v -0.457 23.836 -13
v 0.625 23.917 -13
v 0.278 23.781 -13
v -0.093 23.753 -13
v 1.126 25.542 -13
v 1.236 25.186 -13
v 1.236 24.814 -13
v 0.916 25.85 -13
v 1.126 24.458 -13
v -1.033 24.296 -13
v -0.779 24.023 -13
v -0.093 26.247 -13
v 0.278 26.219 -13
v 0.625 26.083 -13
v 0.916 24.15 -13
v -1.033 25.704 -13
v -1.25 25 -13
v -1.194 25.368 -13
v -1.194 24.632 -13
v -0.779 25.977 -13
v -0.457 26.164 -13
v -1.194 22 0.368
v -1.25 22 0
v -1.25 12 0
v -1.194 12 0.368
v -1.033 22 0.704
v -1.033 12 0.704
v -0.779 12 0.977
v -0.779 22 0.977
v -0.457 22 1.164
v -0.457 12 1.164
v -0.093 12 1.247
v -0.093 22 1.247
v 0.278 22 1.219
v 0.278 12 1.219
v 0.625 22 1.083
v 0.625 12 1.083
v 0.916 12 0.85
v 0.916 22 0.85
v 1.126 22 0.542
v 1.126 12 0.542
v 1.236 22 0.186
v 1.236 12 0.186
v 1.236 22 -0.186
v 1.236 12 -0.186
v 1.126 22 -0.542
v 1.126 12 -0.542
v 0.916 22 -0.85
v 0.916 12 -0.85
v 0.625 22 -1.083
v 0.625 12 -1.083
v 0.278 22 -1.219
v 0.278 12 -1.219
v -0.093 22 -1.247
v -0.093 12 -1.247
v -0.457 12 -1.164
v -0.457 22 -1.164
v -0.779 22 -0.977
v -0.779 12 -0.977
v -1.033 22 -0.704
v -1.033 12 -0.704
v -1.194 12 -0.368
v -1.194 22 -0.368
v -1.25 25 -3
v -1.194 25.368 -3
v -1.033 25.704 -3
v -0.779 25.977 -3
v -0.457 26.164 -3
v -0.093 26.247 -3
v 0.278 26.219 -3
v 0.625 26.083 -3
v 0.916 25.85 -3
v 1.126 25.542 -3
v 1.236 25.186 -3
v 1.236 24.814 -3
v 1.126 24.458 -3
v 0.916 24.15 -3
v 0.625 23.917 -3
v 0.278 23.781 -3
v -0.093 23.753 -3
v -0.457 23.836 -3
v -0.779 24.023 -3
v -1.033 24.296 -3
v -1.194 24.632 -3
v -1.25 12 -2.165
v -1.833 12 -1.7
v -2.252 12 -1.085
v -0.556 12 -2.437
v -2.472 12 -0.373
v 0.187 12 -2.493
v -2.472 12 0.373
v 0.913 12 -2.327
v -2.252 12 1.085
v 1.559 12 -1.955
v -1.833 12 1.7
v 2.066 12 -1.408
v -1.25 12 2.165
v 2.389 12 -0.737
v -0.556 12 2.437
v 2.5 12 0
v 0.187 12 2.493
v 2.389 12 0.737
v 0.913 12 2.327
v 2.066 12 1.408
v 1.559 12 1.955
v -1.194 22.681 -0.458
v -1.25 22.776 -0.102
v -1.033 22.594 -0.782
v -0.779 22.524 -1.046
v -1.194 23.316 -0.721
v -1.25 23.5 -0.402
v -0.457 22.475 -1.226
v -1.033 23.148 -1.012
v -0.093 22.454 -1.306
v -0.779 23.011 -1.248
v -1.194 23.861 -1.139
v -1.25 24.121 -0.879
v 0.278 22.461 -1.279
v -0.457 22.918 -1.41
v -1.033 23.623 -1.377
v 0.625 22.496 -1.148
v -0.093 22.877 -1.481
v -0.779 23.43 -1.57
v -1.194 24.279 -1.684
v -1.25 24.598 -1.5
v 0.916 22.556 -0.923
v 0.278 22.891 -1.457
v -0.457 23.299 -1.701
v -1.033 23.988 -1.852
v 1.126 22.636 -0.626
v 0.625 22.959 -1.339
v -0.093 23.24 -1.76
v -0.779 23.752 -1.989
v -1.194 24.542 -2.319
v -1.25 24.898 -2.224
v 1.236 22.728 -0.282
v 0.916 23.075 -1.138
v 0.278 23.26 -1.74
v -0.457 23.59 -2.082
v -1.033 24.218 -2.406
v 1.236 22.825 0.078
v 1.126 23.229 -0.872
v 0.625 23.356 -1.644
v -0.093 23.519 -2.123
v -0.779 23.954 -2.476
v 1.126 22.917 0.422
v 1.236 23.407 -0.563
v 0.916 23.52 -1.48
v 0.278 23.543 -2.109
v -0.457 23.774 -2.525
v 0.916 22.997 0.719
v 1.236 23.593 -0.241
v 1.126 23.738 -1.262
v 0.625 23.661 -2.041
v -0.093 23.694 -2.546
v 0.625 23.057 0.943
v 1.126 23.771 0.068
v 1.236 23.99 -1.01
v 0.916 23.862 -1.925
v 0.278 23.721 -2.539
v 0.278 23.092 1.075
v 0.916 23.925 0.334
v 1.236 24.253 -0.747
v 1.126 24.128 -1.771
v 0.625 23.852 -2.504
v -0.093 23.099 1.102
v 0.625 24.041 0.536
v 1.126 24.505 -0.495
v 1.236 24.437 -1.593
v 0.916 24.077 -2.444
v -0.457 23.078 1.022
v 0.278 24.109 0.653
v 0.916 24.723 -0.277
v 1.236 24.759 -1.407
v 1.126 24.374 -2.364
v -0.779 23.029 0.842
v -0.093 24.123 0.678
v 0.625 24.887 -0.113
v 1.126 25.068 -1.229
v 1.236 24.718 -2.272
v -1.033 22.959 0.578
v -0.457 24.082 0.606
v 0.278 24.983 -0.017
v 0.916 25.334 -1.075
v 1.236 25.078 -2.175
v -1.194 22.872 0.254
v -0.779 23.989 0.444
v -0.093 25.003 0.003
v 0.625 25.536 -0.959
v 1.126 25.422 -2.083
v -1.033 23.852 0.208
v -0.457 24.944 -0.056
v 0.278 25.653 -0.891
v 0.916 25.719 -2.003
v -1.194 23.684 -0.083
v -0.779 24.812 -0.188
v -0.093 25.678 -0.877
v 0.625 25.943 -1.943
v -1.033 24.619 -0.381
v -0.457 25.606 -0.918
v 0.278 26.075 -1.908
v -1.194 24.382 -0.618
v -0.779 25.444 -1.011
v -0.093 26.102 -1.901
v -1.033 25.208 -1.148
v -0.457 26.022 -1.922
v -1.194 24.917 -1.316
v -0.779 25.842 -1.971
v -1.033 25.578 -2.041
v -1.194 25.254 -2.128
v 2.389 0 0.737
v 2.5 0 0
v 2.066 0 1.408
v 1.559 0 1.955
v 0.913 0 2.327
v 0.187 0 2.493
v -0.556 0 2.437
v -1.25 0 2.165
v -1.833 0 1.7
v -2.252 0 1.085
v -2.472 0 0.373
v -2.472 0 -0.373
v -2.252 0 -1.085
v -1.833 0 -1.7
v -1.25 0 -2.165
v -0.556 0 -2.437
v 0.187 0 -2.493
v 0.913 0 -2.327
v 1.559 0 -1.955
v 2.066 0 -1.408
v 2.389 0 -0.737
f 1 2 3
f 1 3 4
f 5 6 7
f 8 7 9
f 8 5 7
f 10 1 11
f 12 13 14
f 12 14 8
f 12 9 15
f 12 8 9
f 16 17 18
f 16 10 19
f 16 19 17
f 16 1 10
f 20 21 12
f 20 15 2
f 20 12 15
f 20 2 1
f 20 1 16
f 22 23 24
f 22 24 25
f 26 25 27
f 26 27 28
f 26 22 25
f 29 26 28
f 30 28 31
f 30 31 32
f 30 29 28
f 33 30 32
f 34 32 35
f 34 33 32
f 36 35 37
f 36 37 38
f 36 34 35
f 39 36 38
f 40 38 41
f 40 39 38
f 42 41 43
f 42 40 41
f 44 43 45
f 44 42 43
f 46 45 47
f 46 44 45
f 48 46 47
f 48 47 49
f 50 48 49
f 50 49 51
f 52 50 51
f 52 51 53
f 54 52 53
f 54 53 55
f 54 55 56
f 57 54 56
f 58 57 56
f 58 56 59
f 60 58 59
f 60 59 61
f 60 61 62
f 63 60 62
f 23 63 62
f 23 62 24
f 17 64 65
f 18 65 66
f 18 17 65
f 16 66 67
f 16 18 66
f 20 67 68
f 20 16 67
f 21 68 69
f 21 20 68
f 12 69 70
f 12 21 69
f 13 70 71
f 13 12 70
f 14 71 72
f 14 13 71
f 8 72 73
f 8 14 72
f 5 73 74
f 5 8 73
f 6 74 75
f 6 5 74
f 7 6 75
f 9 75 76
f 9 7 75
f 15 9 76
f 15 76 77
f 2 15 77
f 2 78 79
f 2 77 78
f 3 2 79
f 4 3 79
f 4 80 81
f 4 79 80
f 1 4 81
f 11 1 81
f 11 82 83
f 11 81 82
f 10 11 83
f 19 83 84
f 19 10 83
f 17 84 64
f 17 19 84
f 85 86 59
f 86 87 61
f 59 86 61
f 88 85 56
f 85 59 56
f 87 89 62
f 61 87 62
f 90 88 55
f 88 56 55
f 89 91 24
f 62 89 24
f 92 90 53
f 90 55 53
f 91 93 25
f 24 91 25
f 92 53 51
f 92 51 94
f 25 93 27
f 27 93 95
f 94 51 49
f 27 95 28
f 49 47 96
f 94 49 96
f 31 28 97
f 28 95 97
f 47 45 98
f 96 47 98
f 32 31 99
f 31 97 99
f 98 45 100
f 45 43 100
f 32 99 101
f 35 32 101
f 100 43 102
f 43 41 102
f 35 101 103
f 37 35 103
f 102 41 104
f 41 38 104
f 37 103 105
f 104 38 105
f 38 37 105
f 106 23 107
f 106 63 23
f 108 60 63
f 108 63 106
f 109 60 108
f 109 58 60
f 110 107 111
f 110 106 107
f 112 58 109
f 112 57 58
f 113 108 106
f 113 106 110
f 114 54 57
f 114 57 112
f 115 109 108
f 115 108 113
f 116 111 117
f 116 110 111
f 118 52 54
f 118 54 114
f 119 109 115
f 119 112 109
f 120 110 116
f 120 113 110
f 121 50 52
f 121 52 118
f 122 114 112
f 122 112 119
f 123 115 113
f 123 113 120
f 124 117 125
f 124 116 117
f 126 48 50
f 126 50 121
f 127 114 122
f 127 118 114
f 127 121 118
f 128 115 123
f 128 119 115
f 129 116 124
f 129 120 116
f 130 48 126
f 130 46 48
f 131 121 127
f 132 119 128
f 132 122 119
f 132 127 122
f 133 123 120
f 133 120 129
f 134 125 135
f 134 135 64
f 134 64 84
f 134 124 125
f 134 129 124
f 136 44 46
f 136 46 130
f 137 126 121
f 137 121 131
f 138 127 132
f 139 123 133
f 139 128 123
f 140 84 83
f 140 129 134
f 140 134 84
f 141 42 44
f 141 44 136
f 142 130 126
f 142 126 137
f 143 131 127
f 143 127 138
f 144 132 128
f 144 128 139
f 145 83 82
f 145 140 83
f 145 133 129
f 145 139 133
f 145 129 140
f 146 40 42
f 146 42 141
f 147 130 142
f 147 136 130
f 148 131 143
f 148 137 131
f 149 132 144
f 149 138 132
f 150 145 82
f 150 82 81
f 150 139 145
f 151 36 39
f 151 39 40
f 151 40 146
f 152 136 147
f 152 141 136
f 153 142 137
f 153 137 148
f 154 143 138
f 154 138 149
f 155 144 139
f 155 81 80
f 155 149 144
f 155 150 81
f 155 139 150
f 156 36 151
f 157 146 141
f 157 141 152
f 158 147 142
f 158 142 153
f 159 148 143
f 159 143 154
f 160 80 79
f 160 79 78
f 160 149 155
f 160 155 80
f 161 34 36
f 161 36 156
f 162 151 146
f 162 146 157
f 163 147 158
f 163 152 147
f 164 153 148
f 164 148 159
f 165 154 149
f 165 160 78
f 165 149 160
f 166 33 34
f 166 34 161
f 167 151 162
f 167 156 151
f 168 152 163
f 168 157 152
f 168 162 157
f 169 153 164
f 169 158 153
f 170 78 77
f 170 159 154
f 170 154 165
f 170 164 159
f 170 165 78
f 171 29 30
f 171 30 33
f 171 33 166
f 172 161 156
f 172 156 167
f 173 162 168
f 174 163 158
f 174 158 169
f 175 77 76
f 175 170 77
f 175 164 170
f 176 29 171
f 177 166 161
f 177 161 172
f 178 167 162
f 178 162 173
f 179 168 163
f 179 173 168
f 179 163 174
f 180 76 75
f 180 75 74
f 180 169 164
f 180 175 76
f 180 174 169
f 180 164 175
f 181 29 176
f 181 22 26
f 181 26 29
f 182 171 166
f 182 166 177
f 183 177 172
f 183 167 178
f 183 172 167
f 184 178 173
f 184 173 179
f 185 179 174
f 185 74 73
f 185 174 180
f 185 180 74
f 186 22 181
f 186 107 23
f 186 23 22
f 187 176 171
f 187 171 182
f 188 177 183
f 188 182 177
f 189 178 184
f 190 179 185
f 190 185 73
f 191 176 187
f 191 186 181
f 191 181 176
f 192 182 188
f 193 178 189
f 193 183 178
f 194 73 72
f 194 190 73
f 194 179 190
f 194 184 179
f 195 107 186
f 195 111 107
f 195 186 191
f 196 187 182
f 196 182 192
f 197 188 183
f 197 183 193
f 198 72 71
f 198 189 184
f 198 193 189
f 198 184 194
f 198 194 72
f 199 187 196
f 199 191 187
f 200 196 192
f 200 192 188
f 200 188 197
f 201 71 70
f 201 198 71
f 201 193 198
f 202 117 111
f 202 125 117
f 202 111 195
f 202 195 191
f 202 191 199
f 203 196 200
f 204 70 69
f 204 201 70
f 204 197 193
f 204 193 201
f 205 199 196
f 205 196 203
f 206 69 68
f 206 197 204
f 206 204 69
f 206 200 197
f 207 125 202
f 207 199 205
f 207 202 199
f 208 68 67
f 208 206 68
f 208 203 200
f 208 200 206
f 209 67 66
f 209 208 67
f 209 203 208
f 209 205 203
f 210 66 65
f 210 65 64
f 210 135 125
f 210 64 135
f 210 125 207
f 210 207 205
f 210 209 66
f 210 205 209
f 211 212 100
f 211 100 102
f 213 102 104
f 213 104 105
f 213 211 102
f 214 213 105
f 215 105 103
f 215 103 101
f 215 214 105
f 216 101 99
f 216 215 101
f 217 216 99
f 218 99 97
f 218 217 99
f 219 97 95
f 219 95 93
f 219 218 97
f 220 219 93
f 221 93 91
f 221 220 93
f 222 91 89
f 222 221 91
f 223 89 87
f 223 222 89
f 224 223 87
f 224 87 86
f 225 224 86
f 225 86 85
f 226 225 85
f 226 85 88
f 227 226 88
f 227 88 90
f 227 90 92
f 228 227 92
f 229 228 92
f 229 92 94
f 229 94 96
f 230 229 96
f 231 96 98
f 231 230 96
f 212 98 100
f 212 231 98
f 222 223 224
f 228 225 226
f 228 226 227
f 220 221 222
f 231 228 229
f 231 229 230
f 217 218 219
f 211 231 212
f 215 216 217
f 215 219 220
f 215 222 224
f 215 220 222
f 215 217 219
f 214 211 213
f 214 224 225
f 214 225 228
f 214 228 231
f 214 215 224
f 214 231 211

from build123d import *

# Parameters (mm, degrees)
F0_R     = 2.5
F1_DEPTH = 12
F3_R     = 1.25


with BuildPart() as f1:
    # F0 (on Front) → F1 (new body)
    with BuildSketch(Plane.XZ):
        Circle(F0_R)
    extrude(amount=-F1_DEPTH)

    # F4: sweep along a path in F2
    with BuildLine(Plane.YZ) as f4_path:
        Line((12, 0), (22, 0))
        ThreePointArc((22, 0), (24.1213203436, -0.8786796564), (25, -3))
        Line((25, -3), (25, -13))
    # F3 (on face) → F4 (sweep)
    with BuildSketch(Plane(origin=(0, 12, 0), x_dir=(-1, 0, 0), z_dir=(0, 1, 0))):
        Circle(F3_R)
    sweep(path=f4_path.line)


solid = f1.part
